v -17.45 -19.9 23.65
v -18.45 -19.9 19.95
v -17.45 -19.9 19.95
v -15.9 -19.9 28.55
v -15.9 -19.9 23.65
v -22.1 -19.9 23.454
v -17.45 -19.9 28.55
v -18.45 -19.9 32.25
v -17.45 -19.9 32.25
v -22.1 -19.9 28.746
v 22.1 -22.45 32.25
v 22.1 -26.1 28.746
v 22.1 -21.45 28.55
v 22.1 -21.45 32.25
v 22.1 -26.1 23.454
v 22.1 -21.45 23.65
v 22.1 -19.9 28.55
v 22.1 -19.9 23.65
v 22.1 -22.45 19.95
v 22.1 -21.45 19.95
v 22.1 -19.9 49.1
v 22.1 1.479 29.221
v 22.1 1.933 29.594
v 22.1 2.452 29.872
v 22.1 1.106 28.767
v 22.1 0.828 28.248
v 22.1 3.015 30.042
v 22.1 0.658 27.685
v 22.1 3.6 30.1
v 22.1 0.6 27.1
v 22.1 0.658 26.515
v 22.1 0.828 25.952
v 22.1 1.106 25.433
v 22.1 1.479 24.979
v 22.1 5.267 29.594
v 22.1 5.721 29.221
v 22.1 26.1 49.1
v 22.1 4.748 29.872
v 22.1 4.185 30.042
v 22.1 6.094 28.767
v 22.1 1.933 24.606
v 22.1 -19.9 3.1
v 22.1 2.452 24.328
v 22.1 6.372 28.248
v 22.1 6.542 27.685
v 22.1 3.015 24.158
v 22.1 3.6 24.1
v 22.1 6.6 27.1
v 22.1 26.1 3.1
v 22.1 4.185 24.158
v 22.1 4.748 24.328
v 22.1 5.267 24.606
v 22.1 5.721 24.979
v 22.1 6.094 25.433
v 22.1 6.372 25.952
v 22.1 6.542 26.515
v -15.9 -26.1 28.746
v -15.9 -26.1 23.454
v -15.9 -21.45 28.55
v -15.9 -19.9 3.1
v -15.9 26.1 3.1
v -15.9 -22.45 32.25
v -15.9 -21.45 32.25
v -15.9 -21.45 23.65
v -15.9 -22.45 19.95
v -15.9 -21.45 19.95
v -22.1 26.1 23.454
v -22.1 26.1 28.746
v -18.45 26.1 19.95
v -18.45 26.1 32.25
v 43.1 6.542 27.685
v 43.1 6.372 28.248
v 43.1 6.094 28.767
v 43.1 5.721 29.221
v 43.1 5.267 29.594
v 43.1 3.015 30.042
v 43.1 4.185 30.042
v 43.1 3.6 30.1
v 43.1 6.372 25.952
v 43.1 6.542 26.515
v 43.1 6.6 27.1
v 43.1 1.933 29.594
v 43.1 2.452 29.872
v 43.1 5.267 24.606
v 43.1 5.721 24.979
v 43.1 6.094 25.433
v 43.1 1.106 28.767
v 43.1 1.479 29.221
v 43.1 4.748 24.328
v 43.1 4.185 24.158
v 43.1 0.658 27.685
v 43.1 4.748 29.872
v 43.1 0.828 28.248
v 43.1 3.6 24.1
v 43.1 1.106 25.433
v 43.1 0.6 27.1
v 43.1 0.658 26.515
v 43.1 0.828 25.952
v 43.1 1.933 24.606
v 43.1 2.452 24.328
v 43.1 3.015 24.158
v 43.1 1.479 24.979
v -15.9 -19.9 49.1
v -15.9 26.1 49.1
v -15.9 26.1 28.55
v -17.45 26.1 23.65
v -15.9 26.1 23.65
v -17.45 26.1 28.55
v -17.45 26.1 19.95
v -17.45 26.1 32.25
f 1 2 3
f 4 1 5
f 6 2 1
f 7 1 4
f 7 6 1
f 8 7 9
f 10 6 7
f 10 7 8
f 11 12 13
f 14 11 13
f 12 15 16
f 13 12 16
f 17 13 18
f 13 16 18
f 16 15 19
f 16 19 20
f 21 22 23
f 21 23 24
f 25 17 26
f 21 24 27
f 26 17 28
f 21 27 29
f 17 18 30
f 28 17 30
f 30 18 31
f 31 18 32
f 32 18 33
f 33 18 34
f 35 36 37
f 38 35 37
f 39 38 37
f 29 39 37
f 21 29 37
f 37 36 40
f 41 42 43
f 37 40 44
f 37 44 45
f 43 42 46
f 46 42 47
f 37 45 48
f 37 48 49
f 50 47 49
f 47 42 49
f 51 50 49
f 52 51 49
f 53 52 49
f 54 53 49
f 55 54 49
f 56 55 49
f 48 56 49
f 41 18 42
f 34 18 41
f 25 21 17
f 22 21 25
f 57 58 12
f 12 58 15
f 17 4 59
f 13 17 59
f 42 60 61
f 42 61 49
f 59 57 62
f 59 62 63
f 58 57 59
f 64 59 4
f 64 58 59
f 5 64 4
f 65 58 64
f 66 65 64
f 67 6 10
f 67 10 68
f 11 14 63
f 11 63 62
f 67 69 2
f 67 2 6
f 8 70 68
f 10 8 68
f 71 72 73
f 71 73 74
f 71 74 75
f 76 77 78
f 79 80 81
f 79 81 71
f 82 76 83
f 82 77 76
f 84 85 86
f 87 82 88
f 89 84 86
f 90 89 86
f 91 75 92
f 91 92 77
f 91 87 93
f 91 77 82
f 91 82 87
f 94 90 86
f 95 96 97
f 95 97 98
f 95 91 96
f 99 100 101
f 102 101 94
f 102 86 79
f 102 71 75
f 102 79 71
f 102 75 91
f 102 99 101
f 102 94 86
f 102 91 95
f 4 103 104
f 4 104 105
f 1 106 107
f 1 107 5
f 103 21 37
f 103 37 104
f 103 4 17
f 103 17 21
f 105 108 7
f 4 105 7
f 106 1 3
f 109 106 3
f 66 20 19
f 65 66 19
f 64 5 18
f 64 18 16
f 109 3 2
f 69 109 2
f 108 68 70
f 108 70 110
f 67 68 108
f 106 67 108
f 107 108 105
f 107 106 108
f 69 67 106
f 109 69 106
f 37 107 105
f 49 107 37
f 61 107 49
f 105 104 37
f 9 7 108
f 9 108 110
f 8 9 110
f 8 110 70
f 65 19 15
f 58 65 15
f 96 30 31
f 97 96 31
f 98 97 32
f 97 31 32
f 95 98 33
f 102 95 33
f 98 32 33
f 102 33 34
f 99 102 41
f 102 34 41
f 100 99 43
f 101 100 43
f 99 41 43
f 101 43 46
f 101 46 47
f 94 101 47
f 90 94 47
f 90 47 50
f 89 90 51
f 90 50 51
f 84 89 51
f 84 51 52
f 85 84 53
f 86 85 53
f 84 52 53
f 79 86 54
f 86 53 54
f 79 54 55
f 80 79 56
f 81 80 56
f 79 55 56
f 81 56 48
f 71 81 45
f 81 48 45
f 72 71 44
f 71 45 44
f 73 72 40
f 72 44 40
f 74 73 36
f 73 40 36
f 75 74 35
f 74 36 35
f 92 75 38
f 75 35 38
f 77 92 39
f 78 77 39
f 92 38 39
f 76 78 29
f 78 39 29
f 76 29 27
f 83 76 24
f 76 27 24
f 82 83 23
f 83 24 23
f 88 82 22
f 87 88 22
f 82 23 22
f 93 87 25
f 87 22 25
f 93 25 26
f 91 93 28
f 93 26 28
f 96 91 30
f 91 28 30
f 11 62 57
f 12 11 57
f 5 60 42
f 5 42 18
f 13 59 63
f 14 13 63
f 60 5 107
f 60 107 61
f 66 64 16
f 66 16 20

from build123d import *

# Parameters (mm, degrees)
ESQUISSE1_W                  = 44.2
ESQUISSE1_H                  = 52.2
BOSS_EXTRU_1_DEPTH           = 52.2
ENL_V_MAT_EXTRU_2_DEPTH      = 74.209903702
ENL_V_MAT_EXTRU_2_DEPTH_BACK = 44.2
ENL_V_MAT_EXTRU_3_DEPTH      = 74.209903702
ENL_V_MAT_EXTRU_3_DEPTH_BACK = 44.2
ENL_V_MAT_EXTRU_4_DEPTH      = 78.059003368
ENL_V_MAT_EXTRU_4_DEPTH_BACK = 46
ENL_V_MAT_EXTRU_5_DEPTH      = 78.059003368
ENL_V_MAT_EXTRU_5_DEPTH_BACK = 46
ENL_V_MAT_EXTRU_7_DEPTH      = 45.550224466
ENL_V_MAT_EXTRU_7_DEPTH_BACK = 45.550224466
ENL_V_MAT_EXTRU_8_DEPTH      = 78.059003368
ENL_V_MAT_EXTRU_8_DEPTH_BACK = 46
ENL_V_MAT_EXTRU_9_DEPTH      = 75.993733072
ENL_V_MAT_EXTRU_9_DEPTH_BACK = 46
ESQUISSE13_R                 = 3
BOSS_EXTRU_2_DEPTH           = 21


with BuildPart() as part:
    # Esquisse1 → Boss.-Extru.1 (new body)
    with BuildSketch(Plane.XY):
        Rectangle(ESQUISSE1_W, ESQUISSE1_H)
    extrude(amount=BOSS_EXTRU_1_DEPTH)

    # Esquisse2 → Enlèv. mat.-Extru.2 (cut, two sides: drawn at the far end of the back side and taken through both)
    with BuildSketch(Plane(origin=(22.1, 0, 0), x_dir=(0, 0, -1), z_dir=(1, 0, 0)).offset(-ENL_V_MAT_EXTRU_2_DEPTH_BACK)):
        Polygon((-201.352290675, -19.9), (-52.2, -19.9), (-28.55, -19.9), (-28.55, -21.45), (-32.25, -21.45), (-32.25, -22.45), (-28.745559959, -26.1), (74.553898465, -133.690091099), (-39.180744024, -409.461834307), (-315.086933163, -295.671743208), align=None)
    extrude(amount=ENL_V_MAT_EXTRU_2_DEPTH + ENL_V_MAT_EXTRU_2_DEPTH_BACK, mode=Mode.SUBTRACT)

    # Esquisse3 → Enlèv. mat.-Extru.3 (cut, two sides: drawn at the far end of the back side and taken through both)
    with BuildSketch(Plane(origin=(22.1, 0, 0), x_dir=(0, 0, -1), z_dir=(1, 0, 0)).offset(-ENL_V_MAT_EXTRU_3_DEPTH_BACK)):
        Polygon((149.152290675, -19.9), (0, -19.9), (-23.65, -19.9), (-23.65, -21.45), (-19.95, -21.45), (-19.95, -22.45), (-23.454440041, -26.1), (-126.753898465, -133.690091099), (-13.019255976, -409.461834307), (262.886933163, -295.671743208), align=None)
    extrude(amount=ENL_V_MAT_EXTRU_3_DEPTH + ENL_V_MAT_EXTRU_3_DEPTH_BACK, mode=Mode.SUBTRACT)

    # Esquisse4 → Enlèv. mat.-Extru.4 (cut, two sides: drawn at the far end of the back side and taken through both)
    with BuildSketch(Plane(origin=(0, 26.1, 0), x_dir=(1, 0, 0), z_dir=(0, 1, 0)).offset(-ENL_V_MAT_EXTRU_4_DEPTH_BACK)):
        Polygon((-15.9, -191.333109619), (-15.9, -52.2), (-15.9, -28.55), (-17.45, -28.55), (-17.45, -32.25), (-18.45, -32.25), (-22.1, -28.745559959), (-122.462816227, 67.614843274), (-379.791464965, -38.281593439), (-273.228648738, -297.229546332), align=None)
    extrude(amount=ENL_V_MAT_EXTRU_4_DEPTH + ENL_V_MAT_EXTRU_4_DEPTH_BACK, mode=Mode.SUBTRACT)

    # Esquisse5 → Enlèv. mat.-Extru.5 (cut, two sides: drawn at the far end of the back side and taken through both)
    with BuildSketch(Plane(origin=(0, 26.1, 0), x_dir=(1, 0, 0), z_dir=(0, 1, 0)).offset(-ENL_V_MAT_EXTRU_5_DEPTH_BACK)):
        Polygon((-15.9, 139.133109619), (-15.9, 0), (-15.9, -23.65), (-17.45, -23.65), (-17.45, -19.95), (-18.45, -19.95), (-22.1, -23.454440041), (-122.462816228, -119.814843274), (-379.791464965, -13.918406561), (-273.228648738, 245.029546332), align=None)
    extrude(amount=ENL_V_MAT_EXTRU_5_DEPTH + ENL_V_MAT_EXTRU_5_DEPTH_BACK, mode=Mode.SUBTRACT)

    # Esquisse6 → Enlèv. mat.-Extru.7 (cut, two sides: drawn at the far end of the back side and taken through both)
    with BuildSketch(Plane.XY.offset(28.55).offset(-ENL_V_MAT_EXTRU_7_DEPTH_BACK)):
        Polygon((-161.22284167, -19.9), (-22.1, -19.9), (-15.9, -19.9), (-15.9, -26.093649616), (-15.9, -165.216491285), (-212.645110561, -361.97019968), (-357.967952231, -216.653708395), align=None)
    extrude(amount=ENL_V_MAT_EXTRU_7_DEPTH + ENL_V_MAT_EXTRU_7_DEPTH_BACK, mode=Mode.SUBTRACT)

    # Esquisse11 → Enlèv. mat.-Extru.8 (cut, two sides: drawn at the far end of the back side and taken through both)
    with BuildSketch(Plane(origin=(0, 26.1, 0), x_dir=(1, 0, 0), z_dir=(0, 1, 0)).offset(-ENL_V_MAT_EXTRU_8_DEPTH_BACK)):
        Polygon((164.227968273, -49.1), (22.1, -49.1), (-15.9, -49.1), (-158.027968273, -49.1), (-158.027968273, -333.355936546), (164.227968273, -333.355936546), align=None)
    extrude(amount=ENL_V_MAT_EXTRU_8_DEPTH + ENL_V_MAT_EXTRU_8_DEPTH_BACK, mode=Mode.SUBTRACT)

    # Esquisse12 → Enlèv. mat.-Extru.9 (cut, two sides: drawn at the far end of the back side and taken through both)
    with BuildSketch(Plane(origin=(0, 26.1, 0), x_dir=(1, 0, 0), z_dir=(0, 1, 0)).offset(-ENL_V_MAT_EXTRU_9_DEPTH_BACK)):
        Polygon((159.687460199, -3.1), (22.1, -3.1), (-15.9, -3.1), (-153.487460199, -3.1), (-153.487460199, 272.074920398), (159.687460199, 272.074920398), align=None)
    extrude(amount=ENL_V_MAT_EXTRU_9_DEPTH + ENL_V_MAT_EXTRU_9_DEPTH_BACK, mode=Mode.SUBTRACT)

    # Esquisse13 → Boss.-Extru.2 (add)
    with BuildSketch(Plane(origin=(22.1, 0, 0), x_dir=(0, 0, -1), z_dir=(1, 0, 0))):
        with Locations(Location((-27.1, 3.6, 0), (0, 0, 270))):
            Circle(ESQUISSE13_R)
    extrude(amount=BOSS_EXTRU_2_DEPTH)


solid = part.part
